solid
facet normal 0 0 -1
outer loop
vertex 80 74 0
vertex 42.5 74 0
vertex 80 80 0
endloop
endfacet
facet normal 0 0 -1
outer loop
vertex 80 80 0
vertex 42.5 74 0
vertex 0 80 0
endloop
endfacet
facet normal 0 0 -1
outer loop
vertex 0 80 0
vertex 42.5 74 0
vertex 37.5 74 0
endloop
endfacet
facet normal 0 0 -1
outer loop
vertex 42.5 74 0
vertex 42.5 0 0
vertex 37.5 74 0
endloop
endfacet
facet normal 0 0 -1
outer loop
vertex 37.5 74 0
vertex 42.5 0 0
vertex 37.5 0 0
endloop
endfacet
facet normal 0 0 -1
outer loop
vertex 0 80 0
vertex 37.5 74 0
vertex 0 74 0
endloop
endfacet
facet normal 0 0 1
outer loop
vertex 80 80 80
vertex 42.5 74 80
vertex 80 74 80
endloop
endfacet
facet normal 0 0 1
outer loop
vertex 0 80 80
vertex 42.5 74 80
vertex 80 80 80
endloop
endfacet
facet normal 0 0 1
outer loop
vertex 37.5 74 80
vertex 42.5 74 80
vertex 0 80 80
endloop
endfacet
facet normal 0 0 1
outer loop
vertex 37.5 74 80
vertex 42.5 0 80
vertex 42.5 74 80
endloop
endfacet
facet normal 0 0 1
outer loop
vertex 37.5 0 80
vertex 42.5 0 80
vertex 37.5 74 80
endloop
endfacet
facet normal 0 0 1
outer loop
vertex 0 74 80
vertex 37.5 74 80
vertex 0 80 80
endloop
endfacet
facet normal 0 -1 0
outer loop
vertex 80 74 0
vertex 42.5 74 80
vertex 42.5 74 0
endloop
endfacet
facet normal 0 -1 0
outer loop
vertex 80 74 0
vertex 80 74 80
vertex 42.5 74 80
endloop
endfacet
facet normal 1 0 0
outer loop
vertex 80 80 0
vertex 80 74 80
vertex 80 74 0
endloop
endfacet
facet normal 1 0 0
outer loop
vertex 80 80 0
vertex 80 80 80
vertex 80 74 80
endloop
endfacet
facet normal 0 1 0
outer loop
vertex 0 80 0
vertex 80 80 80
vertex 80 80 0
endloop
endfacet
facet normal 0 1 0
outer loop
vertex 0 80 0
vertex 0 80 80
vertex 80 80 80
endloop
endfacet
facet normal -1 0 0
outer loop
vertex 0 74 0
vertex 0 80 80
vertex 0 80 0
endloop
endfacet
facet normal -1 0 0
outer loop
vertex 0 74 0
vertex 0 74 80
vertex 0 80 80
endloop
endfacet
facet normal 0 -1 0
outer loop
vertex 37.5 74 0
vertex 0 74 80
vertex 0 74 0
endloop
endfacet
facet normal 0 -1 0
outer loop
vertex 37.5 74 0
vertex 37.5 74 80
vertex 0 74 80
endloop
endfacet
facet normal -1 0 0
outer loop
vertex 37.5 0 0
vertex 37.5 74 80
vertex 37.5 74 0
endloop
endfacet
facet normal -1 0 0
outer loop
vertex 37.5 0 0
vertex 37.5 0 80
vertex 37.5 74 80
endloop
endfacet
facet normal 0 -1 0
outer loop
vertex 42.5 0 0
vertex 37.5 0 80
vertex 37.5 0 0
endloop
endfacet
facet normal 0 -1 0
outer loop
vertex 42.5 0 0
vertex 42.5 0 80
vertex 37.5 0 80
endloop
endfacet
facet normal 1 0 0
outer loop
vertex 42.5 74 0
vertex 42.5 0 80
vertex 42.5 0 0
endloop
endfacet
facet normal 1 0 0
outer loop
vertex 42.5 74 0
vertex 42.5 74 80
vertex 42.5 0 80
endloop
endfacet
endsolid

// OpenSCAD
$fn = 32;

// ----------------------------------------------------------------------
// Structural section: tee 80 x 80 mm
// ----------------------------------------------------------------------

// --- parameters (mm) ---
sec_w = 80;               // tee width, X
sec_h = 80;               // tee height, Y
flange_t = 6;             // top flange thickness
web_t = 5;                // web thickness
plate_t = 80;             // cut length, Z (extrusion height)

profile = [[37.5, 0], [42.5, 0], [42.5, 74], [80, 74], [80, 80], [0, 80], [0, 74], [37.5, 74]];  // primary outline, 8 points, counter clockwise

// --- the one profile operation ---
linear_extrude(height = plate_t) polygon(points = profile);
